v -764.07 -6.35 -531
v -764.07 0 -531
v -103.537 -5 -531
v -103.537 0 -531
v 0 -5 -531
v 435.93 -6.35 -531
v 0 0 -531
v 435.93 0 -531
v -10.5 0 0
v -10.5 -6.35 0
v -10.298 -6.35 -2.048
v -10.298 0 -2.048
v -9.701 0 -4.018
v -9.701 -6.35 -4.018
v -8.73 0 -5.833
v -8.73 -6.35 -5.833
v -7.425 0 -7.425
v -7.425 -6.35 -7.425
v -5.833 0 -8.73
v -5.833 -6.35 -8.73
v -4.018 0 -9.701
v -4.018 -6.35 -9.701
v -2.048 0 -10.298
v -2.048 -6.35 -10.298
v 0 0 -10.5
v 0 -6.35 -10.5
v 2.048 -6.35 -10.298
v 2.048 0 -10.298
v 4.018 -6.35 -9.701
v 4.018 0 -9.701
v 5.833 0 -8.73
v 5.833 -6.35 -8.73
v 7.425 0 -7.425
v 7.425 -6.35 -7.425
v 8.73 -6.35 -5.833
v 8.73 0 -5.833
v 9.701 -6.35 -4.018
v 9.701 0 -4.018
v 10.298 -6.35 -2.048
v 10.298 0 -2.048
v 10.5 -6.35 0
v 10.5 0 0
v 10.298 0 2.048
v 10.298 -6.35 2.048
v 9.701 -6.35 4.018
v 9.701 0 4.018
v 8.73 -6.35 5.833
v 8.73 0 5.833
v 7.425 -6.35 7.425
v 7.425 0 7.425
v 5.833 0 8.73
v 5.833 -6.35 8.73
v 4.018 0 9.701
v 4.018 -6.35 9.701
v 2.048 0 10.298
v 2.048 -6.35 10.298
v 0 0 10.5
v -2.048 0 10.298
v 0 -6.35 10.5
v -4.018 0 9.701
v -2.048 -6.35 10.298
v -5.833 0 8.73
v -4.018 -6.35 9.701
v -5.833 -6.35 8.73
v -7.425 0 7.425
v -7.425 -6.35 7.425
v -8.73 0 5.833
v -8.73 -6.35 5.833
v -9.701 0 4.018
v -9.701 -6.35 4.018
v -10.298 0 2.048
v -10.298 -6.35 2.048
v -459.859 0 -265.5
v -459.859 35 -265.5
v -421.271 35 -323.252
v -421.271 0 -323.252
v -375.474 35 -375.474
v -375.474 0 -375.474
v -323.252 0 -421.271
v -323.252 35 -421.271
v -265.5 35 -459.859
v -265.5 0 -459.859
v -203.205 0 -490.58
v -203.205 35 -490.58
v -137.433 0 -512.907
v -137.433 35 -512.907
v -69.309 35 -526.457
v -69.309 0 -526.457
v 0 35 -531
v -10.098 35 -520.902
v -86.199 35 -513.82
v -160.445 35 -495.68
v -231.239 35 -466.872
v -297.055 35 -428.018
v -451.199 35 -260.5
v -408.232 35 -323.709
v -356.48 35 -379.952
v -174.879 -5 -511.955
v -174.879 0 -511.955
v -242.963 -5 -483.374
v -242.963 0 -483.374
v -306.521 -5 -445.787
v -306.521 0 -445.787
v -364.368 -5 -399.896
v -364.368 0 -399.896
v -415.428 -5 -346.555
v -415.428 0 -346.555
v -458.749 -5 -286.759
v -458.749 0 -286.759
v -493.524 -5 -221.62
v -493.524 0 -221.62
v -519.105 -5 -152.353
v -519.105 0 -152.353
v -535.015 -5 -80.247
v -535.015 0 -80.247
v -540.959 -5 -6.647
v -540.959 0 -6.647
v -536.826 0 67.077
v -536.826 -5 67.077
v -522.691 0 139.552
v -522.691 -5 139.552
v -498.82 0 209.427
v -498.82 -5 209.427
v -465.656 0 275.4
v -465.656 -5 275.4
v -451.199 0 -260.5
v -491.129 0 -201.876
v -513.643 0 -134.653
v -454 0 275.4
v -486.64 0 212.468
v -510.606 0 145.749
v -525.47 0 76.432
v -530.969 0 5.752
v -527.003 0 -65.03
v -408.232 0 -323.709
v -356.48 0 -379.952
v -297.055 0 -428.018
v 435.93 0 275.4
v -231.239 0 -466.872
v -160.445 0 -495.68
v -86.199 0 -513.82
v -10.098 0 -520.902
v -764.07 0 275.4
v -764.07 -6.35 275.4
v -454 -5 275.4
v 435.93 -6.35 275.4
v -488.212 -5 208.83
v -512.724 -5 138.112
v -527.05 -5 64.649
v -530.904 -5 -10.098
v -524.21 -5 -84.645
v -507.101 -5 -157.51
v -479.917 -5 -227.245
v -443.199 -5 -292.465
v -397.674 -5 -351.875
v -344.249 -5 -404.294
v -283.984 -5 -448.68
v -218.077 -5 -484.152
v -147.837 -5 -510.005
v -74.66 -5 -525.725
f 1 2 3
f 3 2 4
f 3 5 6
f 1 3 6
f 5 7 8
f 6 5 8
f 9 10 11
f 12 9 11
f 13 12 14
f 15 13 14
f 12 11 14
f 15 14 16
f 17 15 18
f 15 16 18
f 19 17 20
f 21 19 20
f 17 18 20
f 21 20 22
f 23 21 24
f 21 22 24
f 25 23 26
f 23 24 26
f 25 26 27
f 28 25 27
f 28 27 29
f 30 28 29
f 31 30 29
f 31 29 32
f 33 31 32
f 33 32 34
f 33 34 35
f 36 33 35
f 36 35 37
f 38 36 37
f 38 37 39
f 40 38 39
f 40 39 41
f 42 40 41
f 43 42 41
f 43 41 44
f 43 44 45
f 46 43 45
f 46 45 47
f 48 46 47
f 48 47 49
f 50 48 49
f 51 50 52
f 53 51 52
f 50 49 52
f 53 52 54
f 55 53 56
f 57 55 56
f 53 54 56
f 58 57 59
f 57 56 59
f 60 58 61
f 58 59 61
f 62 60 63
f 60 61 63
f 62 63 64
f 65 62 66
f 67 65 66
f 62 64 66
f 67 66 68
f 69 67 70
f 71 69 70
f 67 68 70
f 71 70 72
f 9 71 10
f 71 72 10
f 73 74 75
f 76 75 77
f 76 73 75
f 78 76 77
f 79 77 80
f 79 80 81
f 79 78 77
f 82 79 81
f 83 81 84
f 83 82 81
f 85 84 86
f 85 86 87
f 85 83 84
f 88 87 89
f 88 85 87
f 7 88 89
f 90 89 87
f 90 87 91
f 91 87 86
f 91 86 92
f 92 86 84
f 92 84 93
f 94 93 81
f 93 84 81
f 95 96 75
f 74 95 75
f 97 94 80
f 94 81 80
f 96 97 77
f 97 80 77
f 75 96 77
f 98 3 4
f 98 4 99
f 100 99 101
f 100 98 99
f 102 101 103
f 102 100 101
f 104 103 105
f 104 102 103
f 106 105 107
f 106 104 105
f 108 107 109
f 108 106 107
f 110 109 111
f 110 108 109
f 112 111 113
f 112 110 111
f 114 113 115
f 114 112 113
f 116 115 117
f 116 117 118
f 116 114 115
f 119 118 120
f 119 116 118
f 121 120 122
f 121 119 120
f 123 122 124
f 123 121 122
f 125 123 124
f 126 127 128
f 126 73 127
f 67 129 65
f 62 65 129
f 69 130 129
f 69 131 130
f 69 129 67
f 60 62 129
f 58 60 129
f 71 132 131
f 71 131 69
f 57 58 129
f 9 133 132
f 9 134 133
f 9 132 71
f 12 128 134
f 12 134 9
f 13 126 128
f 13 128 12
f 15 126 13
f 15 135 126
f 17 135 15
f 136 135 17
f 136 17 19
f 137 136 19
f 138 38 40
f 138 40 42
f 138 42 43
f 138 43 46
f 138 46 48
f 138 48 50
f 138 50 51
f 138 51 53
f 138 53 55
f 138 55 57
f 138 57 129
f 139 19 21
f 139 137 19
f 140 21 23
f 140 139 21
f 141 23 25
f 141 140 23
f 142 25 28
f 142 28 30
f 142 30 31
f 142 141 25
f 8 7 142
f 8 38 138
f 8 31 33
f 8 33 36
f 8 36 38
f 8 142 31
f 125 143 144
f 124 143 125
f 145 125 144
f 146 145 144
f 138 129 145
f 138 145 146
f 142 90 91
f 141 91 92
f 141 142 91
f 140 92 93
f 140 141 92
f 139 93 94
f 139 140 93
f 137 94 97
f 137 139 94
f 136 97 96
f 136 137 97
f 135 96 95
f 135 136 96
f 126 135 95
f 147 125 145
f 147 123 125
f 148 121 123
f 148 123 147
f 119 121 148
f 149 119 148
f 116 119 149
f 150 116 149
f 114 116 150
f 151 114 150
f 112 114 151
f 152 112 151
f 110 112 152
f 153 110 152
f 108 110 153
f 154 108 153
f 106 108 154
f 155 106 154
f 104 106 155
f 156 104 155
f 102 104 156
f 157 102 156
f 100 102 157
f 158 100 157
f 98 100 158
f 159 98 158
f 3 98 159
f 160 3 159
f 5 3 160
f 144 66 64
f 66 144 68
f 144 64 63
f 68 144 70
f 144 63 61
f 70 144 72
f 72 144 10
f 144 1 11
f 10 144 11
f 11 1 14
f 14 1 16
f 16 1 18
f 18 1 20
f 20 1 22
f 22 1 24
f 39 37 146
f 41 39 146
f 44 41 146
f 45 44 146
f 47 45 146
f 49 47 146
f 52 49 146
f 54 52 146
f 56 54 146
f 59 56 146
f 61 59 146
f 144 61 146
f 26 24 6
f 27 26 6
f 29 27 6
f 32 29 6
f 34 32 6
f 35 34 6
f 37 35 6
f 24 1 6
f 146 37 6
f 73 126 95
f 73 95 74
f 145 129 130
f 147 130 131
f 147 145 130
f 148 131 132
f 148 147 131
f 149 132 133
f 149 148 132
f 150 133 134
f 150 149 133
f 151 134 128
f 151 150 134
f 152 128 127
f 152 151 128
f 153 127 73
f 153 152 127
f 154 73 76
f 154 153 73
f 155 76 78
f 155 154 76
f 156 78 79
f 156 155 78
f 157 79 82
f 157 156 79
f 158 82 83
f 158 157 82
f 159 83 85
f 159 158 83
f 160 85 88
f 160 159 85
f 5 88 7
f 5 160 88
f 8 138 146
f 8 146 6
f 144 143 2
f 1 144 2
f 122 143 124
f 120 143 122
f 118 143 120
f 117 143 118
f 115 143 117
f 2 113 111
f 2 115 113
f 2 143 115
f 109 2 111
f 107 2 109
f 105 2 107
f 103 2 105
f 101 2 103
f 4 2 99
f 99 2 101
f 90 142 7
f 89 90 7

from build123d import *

# Parameters (mm, degrees)
BOSS_EXTRUDE1_DEPTH    = 35
SKETCH4_W              = 1200
SKETCH4_H              = 806.4
BOSS_EXTRUDE2_DEPTH    = 6.35
CHAMFER1_SIZE          = 10
F_20_0MM_DOWEL_HOLE1_D = 21
CUT_EXTRUDE1_START     = -5
CUT_EXTRUDE1_DEPTH     = 5


with BuildPart() as part:
    # Sketch3 → Boss-Extrude1 (new body)
    with BuildSketch(Plane(origin=(0, 0, 0), x_dir=(1, 0, 0), z_dir=(0, 1, 0))):
        with BuildLine():
            Line((0, 531), (0, 521))
            ThreePointArc((0, 521), (-260.5, 451.199235372), (-451.199235372, 260.5))
            Line((-451.199235372, 260.5), (-459.85948941, 265.5))
            ThreePointArc((-459.85948941, 265.5), (-265.5, 459.85948941), (0, 531))
        make_face()
    extrude(amount=BOSS_EXTRUDE1_DEPTH)

    # Sketch4 → Boss-Extrude2 (add)
    with BuildSketch(Plane(origin=(0, 0, 0), x_dir=(1, 0, 0), z_dir=(0, 1, 0))):
        with Locations((-164.07, 127.8)):
            Rectangle(SKETCH4_W, SKETCH4_H)
    extrude(amount=-BOSS_EXTRUDE2_DEPTH)

    # Chamfer1
    # the kernel refuses this chamfer: 10 mm, written as the material it takes off along each edge
    with BuildSketch(Plane(origin=(0, 0, -521), x_dir=(-0.999953038196086, 0, 0.009691305506332204), z_dir=(0, 1, 0))) as chamfer1_piece_1:
        with BuildLine():
            Line((10.098340338, 0), (-CHAMFER1_SIZE * 0.00969130550632, -CHAMFER1_SIZE * 0.999953038196))
            Line((-CHAMFER1_SIZE * 0.00969130550632, -CHAMFER1_SIZE * 0.999953038196), (0, 0))
            ThreePointArc((0, 0), (5.192000536, -0.024447522), (10.098340338, 0))
        make_face()
    extrude(amount=60.969219121, mode=Mode.SUBTRACT)

    # Ø20.0mm Dowel Hole1 (through all)
    with Locations(Plane(origin=(0, 0, 0), x_dir=(1, 0, 0), z_dir=(0, 1, 0))):
        with Locations((0, 0)):
            Hole(F_20_0MM_DOWEL_HOLE1_D / 2)

    # Sketch8 → Cut-Extrude1 (cut)
    with BuildSketch(Plane(origin=(0, 0, 0), x_dir=(1, 0, 0), z_dir=(0, 1, 0)).offset(CUT_EXTRUDE1_START)):
        with BuildLine():
            Line((-462.549726308, -280.586440678), (-453.999823789, -275.4))
            ThreePointArc((-453.999823789, -275.4), (-462.708547576, 260.502975031), (0, 531))
            Line((0, 531), (0, 541))
            ThreePointArc((0, 541), (-471.422456193, 265.408869099), (-462.549726308, -280.586440678))
        make_face()
    extrude(amount=CUT_EXTRUDE1_DEPTH, mode=Mode.SUBTRACT)


solid = part.part
